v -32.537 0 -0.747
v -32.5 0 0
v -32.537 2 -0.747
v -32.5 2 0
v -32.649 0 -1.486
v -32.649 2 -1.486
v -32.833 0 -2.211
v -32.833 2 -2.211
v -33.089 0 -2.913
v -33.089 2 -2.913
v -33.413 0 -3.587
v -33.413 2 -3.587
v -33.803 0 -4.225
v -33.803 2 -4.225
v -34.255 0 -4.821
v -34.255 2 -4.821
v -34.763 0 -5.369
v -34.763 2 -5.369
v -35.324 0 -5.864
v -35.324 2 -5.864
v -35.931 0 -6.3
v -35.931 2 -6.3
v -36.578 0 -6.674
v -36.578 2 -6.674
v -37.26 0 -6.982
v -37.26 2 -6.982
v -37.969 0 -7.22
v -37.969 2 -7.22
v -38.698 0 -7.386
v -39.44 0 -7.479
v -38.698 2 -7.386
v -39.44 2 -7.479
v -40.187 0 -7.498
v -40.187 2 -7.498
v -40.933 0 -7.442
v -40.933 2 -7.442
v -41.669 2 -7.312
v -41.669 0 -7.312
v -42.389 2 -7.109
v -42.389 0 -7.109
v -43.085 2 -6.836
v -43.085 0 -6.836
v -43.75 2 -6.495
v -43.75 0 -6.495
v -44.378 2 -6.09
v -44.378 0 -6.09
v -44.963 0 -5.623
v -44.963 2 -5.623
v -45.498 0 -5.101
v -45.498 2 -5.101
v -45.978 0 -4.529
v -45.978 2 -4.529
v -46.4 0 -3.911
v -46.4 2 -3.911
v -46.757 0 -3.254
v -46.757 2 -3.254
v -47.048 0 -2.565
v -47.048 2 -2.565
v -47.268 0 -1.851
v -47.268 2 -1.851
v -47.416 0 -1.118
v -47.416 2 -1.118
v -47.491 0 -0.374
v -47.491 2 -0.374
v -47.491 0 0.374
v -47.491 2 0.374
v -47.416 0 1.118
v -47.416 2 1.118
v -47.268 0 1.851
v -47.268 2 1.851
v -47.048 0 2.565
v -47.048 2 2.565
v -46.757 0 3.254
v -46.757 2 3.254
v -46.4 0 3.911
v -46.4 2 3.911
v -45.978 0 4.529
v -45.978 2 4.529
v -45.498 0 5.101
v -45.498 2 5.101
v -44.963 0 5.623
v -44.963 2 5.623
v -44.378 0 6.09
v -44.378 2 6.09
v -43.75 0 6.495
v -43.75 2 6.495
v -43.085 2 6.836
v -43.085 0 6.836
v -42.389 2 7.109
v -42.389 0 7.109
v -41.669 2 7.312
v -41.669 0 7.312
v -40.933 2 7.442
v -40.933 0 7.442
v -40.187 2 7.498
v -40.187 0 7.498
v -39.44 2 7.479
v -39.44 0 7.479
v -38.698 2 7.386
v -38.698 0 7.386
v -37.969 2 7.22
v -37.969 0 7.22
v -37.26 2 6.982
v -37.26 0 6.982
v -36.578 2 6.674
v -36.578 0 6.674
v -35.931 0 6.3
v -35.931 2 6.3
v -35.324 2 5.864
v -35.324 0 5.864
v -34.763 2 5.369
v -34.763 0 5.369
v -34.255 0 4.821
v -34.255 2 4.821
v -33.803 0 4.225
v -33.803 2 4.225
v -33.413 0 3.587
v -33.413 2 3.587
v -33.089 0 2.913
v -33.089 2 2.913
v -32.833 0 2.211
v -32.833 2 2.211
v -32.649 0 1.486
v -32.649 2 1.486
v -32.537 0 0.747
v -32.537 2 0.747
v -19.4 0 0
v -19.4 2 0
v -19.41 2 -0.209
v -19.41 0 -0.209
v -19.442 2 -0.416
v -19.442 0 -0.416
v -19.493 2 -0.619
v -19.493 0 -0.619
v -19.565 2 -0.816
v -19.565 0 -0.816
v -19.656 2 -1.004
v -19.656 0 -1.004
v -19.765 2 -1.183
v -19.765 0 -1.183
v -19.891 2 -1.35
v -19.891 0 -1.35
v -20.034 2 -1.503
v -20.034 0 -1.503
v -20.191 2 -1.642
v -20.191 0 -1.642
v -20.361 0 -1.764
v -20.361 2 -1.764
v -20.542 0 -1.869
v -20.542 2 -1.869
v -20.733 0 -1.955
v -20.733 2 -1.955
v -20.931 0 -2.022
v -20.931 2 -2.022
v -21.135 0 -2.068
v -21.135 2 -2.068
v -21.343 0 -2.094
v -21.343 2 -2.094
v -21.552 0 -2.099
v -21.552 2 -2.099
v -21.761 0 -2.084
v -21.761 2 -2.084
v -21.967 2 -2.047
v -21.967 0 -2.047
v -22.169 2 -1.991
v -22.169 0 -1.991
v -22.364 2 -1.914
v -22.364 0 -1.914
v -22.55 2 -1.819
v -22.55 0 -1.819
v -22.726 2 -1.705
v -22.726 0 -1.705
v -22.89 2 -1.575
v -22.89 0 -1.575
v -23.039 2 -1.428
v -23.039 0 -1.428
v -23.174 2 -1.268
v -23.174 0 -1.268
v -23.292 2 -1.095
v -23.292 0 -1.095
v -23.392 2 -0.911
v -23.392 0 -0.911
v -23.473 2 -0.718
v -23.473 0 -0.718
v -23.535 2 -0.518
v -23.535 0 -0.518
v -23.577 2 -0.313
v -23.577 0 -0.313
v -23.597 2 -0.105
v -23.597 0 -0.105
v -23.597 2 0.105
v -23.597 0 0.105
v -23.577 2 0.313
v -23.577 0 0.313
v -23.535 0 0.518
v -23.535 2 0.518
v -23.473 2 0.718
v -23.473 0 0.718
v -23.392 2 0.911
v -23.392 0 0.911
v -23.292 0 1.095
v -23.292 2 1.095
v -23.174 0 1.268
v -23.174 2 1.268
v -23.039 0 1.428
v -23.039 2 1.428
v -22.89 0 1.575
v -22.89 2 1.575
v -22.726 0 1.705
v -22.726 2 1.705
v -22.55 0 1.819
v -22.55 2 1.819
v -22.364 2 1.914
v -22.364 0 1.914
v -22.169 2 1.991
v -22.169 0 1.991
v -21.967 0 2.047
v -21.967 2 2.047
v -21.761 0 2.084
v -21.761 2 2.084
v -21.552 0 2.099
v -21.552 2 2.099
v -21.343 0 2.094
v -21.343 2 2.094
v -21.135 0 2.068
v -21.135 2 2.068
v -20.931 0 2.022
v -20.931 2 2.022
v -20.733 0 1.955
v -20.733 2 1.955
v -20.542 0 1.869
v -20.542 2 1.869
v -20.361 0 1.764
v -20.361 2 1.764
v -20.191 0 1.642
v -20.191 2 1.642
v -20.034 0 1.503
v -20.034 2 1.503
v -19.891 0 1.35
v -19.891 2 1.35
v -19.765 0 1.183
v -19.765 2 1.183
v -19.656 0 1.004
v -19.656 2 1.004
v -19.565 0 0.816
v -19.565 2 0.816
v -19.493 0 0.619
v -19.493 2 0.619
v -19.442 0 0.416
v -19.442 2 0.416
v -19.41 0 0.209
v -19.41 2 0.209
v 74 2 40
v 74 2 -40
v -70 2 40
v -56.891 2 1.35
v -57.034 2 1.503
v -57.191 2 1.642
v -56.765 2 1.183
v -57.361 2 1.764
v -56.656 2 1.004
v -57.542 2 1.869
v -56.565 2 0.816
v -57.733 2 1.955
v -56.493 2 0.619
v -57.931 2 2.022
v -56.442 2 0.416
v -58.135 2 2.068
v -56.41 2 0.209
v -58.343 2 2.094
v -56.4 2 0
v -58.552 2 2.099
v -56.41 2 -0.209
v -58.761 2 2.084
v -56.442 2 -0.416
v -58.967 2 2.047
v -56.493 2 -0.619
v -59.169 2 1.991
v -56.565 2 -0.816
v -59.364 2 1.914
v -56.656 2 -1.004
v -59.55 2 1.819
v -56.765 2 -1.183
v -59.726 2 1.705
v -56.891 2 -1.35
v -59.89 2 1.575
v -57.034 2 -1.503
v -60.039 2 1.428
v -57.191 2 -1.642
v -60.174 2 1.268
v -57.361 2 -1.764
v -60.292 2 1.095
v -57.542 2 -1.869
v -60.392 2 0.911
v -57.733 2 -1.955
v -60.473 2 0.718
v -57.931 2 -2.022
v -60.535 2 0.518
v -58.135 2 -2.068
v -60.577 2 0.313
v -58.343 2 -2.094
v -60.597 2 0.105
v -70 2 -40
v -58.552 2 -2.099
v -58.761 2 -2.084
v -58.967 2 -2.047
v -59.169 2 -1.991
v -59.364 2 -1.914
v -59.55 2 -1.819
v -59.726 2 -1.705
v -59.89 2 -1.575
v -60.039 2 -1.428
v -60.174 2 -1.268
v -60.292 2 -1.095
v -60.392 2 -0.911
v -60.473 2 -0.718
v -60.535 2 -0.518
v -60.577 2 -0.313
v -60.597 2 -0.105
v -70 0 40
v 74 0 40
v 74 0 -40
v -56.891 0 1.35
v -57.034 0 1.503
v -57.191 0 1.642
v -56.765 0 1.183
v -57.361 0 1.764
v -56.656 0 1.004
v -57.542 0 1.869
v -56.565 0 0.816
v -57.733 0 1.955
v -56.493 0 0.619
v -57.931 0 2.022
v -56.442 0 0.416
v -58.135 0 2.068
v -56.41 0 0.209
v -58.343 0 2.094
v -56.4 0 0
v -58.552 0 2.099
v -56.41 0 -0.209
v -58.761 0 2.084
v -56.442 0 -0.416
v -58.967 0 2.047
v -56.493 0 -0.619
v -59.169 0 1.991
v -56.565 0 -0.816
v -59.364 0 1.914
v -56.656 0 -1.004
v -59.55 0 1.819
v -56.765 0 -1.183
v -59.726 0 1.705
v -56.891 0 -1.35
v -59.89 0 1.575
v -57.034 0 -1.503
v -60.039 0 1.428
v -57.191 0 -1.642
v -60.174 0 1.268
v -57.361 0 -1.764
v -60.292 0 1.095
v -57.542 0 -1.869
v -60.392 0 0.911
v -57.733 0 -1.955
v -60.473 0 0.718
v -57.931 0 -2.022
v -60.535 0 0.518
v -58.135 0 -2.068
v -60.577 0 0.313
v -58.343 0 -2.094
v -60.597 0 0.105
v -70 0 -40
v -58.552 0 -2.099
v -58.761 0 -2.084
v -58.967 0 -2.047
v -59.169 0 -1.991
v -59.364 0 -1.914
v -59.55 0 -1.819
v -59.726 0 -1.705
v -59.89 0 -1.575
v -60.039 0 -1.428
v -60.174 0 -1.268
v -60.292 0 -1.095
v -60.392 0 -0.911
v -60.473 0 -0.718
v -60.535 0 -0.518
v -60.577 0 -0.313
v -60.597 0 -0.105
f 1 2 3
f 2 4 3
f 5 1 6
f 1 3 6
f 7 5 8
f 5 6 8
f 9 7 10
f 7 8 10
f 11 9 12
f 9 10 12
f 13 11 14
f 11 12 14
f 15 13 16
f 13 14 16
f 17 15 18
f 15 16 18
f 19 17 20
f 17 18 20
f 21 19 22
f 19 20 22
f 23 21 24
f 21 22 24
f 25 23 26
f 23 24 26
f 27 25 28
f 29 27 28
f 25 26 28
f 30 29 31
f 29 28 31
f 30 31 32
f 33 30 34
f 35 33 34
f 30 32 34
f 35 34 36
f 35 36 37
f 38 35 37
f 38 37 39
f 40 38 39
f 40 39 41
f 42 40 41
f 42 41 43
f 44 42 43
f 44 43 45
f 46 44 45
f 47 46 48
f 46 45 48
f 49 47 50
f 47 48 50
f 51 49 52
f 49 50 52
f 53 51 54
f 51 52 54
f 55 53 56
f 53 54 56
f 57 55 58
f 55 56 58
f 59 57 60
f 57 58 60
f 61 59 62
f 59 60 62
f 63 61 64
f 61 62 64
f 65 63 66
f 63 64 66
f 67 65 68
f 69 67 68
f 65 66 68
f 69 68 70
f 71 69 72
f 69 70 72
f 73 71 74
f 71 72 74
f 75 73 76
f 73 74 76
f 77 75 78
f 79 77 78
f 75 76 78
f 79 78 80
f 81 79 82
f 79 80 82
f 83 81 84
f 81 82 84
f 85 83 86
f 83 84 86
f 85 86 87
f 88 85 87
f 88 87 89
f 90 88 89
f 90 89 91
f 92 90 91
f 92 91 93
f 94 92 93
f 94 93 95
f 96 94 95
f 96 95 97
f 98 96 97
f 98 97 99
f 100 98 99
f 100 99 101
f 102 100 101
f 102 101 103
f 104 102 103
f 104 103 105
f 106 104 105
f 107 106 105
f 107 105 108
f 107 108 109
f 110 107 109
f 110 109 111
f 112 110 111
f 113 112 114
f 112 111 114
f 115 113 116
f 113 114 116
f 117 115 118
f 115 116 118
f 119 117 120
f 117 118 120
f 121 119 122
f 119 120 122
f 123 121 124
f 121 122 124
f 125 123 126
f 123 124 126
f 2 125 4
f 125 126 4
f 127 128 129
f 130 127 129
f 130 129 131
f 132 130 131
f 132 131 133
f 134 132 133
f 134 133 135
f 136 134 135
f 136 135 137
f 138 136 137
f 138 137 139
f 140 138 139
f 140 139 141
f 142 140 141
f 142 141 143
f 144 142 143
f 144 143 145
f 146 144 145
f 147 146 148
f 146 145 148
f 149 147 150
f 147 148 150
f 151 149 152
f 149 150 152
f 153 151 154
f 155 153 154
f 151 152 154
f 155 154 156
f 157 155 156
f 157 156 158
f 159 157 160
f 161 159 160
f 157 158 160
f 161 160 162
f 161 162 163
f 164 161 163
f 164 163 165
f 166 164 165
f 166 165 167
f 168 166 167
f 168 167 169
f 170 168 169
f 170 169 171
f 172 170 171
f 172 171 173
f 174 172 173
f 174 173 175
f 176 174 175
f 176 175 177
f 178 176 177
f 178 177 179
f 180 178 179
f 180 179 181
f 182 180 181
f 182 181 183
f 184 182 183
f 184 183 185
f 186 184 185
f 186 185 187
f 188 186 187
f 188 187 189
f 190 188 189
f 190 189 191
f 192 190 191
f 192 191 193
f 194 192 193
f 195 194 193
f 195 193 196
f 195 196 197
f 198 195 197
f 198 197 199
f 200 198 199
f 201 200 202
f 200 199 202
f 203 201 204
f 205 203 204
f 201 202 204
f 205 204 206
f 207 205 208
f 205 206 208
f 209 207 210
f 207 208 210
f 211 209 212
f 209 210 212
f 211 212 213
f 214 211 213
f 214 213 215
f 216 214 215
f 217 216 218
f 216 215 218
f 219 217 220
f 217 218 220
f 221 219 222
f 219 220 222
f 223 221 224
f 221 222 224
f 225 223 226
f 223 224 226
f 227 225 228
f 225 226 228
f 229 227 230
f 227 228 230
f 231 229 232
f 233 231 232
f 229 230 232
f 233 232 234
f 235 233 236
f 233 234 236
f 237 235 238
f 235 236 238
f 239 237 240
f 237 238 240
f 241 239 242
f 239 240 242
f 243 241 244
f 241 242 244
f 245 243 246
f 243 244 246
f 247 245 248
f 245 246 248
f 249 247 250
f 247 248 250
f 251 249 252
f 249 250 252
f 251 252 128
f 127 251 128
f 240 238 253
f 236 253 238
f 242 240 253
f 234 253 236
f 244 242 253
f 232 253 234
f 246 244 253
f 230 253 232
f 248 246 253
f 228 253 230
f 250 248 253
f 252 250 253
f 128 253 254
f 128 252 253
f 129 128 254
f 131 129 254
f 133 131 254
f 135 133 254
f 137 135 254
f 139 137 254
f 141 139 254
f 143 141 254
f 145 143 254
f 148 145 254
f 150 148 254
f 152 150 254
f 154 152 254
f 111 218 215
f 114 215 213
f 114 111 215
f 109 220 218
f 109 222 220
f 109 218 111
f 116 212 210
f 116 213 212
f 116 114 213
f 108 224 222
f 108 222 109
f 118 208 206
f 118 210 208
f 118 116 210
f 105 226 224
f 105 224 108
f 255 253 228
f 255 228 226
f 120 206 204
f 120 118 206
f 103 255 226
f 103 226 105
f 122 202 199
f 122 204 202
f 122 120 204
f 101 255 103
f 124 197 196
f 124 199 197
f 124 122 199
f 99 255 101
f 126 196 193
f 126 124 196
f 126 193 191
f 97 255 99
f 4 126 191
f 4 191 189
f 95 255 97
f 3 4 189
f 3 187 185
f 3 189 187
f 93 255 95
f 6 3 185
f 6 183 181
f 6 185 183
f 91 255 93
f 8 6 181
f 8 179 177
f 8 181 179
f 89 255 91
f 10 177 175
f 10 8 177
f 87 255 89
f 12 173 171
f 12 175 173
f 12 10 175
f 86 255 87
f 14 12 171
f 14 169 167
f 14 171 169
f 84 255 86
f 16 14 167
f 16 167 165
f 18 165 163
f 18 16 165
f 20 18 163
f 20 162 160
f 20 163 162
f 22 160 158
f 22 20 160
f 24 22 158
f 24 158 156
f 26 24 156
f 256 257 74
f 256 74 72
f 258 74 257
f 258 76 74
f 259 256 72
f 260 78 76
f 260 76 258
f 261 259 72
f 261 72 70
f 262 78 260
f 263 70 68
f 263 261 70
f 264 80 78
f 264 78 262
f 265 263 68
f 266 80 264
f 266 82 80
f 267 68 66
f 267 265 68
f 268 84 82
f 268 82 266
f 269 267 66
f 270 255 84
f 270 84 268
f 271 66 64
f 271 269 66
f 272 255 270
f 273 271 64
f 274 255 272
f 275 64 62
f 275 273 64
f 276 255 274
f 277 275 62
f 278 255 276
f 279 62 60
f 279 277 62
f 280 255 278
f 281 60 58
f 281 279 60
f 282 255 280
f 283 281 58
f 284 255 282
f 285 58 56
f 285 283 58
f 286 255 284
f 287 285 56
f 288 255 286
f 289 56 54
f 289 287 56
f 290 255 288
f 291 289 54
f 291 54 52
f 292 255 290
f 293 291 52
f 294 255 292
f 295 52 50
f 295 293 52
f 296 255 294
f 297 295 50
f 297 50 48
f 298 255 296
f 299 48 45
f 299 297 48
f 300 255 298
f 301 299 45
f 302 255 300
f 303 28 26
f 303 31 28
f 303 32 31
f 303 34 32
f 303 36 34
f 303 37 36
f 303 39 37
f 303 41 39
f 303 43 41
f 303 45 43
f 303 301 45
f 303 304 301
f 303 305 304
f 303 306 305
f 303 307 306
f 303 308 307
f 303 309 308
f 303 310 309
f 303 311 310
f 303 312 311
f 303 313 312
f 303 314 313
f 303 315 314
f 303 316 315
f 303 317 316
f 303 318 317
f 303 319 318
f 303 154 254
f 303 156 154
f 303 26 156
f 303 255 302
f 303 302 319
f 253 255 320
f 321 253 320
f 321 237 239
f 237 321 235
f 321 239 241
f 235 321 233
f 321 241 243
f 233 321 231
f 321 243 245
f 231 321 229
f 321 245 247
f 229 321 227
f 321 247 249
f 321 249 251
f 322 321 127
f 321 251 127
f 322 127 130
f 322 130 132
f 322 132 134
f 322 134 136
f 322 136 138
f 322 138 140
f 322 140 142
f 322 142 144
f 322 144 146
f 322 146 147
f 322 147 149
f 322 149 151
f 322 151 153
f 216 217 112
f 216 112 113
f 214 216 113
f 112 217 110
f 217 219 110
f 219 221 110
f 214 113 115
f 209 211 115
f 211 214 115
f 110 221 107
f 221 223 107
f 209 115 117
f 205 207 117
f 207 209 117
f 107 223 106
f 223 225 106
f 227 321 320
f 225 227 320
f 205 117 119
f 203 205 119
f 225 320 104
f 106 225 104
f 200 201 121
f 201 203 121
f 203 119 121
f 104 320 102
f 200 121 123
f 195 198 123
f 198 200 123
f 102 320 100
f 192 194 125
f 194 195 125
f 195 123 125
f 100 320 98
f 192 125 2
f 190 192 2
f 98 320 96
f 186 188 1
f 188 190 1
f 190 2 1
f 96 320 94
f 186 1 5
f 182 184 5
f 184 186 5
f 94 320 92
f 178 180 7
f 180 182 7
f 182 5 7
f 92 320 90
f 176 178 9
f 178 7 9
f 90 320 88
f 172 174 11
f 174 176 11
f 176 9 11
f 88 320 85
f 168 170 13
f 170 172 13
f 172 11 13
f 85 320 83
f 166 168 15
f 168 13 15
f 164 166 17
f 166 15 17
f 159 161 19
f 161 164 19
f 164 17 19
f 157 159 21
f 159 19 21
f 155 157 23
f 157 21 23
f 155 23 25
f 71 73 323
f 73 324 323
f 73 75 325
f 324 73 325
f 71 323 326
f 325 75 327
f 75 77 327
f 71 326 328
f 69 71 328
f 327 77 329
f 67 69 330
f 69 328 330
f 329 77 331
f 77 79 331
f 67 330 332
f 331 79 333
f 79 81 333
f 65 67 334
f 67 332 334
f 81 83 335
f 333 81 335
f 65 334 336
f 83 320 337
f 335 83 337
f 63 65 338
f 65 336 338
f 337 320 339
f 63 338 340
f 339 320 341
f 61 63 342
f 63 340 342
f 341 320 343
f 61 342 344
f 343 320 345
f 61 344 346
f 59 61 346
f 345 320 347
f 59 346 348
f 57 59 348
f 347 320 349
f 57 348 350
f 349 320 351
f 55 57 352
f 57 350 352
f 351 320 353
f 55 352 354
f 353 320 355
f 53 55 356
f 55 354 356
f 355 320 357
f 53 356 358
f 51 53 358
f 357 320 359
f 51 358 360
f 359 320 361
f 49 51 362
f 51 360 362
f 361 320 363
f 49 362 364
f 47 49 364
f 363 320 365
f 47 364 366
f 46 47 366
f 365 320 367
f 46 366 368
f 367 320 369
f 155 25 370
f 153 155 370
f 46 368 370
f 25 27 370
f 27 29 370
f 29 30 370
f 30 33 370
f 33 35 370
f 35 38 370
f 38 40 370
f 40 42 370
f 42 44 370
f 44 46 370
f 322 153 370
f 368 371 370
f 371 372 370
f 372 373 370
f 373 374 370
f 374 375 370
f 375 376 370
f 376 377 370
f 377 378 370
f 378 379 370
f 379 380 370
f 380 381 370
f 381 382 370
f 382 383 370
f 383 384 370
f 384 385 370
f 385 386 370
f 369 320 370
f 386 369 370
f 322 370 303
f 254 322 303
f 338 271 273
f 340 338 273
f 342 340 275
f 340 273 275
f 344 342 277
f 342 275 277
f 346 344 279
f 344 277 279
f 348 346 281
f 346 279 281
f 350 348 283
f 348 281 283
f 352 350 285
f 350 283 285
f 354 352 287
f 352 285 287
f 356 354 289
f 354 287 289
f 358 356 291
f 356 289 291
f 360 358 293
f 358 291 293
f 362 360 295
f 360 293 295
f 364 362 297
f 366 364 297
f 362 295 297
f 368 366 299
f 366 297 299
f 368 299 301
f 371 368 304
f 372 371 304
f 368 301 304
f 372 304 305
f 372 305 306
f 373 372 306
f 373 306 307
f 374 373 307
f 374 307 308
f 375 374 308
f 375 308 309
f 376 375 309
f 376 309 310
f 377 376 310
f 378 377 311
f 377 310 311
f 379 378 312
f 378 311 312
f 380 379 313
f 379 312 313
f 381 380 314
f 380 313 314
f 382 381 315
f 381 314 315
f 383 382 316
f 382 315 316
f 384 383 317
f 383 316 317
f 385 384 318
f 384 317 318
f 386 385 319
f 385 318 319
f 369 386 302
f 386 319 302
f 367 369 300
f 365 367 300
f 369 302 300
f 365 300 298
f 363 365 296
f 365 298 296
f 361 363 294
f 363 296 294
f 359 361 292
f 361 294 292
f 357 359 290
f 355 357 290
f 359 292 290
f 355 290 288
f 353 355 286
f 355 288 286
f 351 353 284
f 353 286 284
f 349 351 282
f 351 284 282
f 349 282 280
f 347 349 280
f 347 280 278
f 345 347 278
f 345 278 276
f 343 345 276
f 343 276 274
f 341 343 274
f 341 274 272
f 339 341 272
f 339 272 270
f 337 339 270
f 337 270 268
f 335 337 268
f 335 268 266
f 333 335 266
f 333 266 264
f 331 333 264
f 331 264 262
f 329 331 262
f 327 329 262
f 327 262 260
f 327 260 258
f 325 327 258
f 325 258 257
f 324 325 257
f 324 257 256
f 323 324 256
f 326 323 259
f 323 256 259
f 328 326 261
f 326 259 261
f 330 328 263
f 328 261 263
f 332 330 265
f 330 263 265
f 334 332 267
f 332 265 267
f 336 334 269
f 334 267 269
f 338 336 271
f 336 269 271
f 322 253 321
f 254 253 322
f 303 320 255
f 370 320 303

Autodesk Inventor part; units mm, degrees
ref_plane "YZ Plane" through (0, 0, 0) normal (1, 0, 0) x (0, 1, 0)
ref_plane "XZ Plane" through (0, 0, 0) normal (0, 1, 0) x (-1, 0, 0)
ref_plane "XY Plane" through (0, 0, 0) normal (0, 0, 1) x (1, 0, 0)
sketch "スケッチ1" plane through (0, 0, 0) normal (0, 1, 0) x (-1, 0, 0)
  line L0 (-70, 40) -> (70, 40)
  line L1 (70, 40) -> (70, -40)
  line L2 (70, -40) -> (-70, -40)
  line L3 (-70, -40) -> (-70, 40)
  line L4 (-70, 40) -> (70, -40) construction
  line L5 (70, 40) -> (-70, -40) construction
  point P0 (0, 0)
  dimension "d0" = 140
  dimension "d1" = 80
extrude "押し出し1" add sketch "スケッチ1" along normal blind 2
sketch "スケッチ2" plane through (0, 2, 0) normal (0, 1, 0) x (1, 0, 0)
  circle A0 centre (-40, 0) radius 7.5
  circle A1 centre (-58.5, 0) radius 2.1
  circle A2 centre (-21.5, 0) radius 2.1
  line L0 (70, 40) -> (70, -40) projected
  point P0 (0, 0)
  dimension "d4" = 15
  dimension "d6" = 4.2
  dimension "d7" = 4.2
  dimension "d8" = 37
  dimension "d9" = 18.5
  dimension "d12" = 110
extrude "押し出し2" cut sketch "スケッチ2" against normal blind 8
sketch "スケッチ3" plane through (70, 0, 40) normal (1, 0, 0) x (0, 0, -1)
  line L0 (0, 2) -> (80, 2) projected
  line L1 (0, 0) -> (80, 0)
  line L2 (80, 0) -> (80, 2)
  line L3 (80, 2) -> (0, 2)
  line L4 (0, 2) -> (0, 0)
  point P0 (40, 0)
extrude "押し出し3" add sketch "スケッチ3" along normal blind 4
properties part number "sholder_2" material "アルミニウム 6061"
